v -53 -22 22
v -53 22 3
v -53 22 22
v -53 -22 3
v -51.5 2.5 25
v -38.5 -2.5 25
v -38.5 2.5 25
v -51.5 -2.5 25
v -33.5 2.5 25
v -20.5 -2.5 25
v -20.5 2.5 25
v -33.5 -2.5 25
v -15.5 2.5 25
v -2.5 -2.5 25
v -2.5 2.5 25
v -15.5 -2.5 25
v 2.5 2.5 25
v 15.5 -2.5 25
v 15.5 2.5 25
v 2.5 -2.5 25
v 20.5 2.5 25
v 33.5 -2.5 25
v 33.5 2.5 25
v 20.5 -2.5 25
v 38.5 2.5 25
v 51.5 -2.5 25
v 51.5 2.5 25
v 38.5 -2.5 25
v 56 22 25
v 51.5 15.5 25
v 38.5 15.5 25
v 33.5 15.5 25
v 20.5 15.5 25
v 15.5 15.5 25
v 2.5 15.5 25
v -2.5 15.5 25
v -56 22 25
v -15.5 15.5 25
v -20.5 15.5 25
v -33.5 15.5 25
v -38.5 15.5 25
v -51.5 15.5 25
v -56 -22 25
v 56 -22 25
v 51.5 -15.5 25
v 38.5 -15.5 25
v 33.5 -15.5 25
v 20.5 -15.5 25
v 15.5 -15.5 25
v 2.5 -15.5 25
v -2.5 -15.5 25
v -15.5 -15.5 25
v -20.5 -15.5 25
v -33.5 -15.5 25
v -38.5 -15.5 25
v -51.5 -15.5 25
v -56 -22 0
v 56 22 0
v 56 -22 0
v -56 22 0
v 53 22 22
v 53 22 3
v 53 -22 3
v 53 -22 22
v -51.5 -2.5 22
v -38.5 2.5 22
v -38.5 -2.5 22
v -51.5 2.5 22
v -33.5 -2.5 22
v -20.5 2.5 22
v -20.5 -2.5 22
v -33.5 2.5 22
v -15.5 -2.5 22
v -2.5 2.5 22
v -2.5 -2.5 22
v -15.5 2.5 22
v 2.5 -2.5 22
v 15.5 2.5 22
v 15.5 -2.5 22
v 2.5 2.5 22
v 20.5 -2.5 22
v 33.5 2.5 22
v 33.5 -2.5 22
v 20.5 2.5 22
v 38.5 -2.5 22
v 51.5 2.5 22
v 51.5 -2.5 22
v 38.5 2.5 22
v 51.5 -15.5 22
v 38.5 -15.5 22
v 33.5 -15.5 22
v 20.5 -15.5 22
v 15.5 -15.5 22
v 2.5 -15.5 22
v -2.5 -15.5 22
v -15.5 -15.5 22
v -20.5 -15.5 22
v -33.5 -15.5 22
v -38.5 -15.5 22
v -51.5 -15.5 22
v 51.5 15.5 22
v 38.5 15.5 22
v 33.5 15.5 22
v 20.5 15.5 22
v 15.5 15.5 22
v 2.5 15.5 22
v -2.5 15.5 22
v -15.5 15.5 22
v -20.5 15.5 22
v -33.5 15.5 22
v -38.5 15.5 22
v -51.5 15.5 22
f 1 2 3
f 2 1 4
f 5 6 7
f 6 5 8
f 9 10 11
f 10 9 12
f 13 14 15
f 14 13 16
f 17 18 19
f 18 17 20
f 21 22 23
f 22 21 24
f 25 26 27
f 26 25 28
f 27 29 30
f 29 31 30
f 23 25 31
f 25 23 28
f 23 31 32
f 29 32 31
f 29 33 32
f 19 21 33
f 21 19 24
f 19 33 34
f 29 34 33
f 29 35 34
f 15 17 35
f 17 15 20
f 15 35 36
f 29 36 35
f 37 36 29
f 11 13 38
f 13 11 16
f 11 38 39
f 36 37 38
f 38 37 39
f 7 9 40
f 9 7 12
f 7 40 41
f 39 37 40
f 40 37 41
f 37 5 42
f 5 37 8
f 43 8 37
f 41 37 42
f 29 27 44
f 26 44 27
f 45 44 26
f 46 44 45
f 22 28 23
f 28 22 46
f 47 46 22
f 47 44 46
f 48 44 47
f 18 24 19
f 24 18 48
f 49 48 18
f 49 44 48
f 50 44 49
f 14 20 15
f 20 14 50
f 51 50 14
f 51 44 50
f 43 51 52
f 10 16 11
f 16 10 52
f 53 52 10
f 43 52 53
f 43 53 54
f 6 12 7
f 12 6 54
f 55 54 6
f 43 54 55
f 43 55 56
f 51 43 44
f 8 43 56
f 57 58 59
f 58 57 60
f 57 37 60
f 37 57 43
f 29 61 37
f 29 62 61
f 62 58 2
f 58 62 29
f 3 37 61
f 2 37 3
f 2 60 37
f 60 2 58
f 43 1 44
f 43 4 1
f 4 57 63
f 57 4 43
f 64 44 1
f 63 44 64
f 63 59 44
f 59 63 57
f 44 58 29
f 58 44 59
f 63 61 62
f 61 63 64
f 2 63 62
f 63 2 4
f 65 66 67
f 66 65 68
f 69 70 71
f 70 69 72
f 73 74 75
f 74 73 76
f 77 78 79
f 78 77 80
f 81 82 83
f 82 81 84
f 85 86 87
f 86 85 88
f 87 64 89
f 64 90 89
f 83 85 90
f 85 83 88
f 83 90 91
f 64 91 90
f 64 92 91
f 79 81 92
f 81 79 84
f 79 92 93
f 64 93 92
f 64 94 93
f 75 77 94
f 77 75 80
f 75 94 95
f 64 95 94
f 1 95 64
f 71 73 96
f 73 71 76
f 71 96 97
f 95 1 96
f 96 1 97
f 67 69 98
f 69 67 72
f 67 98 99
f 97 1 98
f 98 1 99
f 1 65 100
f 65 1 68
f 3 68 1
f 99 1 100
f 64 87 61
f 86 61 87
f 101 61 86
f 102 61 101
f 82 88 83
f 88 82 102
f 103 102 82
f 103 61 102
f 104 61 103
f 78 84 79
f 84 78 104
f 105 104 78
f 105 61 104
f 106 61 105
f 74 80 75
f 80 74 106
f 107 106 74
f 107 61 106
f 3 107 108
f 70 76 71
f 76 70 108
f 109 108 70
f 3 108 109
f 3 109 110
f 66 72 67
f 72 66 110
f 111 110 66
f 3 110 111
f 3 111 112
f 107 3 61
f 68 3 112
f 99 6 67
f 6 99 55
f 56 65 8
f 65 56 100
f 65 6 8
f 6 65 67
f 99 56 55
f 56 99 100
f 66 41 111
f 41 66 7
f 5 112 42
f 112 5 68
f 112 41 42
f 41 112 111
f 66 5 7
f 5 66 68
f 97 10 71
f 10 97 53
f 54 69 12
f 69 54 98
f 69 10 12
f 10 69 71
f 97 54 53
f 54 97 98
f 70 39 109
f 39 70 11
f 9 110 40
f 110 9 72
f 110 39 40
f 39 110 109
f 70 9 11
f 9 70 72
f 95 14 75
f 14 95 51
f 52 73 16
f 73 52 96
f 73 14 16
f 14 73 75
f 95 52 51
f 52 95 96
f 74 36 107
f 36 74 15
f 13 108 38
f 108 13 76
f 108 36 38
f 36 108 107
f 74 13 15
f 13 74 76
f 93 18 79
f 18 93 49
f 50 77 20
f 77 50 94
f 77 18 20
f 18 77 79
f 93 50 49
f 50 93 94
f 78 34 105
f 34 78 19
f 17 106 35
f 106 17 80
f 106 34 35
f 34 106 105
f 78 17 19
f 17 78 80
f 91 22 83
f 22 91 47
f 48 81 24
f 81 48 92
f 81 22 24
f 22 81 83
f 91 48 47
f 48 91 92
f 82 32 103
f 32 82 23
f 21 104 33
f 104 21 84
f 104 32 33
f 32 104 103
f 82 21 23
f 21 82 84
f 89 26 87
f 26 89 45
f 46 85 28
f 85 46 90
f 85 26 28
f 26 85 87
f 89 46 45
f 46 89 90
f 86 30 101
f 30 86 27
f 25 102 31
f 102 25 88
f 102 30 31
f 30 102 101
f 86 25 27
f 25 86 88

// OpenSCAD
// KNOWN-WRONG PART (must fail): only the two end walls carry the deck (the five ribs are missing)
// Open-sided rack for 12 standard 12.5 mm square cuvettes (2 rows of 6)
// Category: benchware. A base plate and a perforated deck joined by seven upright walls that run
// front to back; the long sides stay open, so the cuvettes can be seen and read in the rack.
// The deck bridges only 15.5 mm between walls, so it prints without supports.
// Print: PLA or PETG, base on the bed, 0.2 mm layers.
// SPDX-License-Identifier: CERN-OHL-P-2.0

/* [Rack] */
plate = [112, 44];        // X, Y of the base plate and the deck [mm]
base_t = 3;               // base plate z = 0 .. 3
deck_z = 22;              // deck from z = 22 ...
deck_t = 3;               // ... to z = 25
end_t = 3;                // end walls, flush with the short ends
rib_t = 2.5;              // inner ribs
rib_x = [];
cols = 6;                 // holes along X
rows = 2;                 // holes along Y
pitch = 18;               // centre-to-centre in X and Y
hole = 13;                // square hole for a 12.5 mm cuvette

/* [Hidden] */
eps = 0.01;
H = deck_z + deck_t;

difference() {
    union() {
        translate([-plate.x / 2, -plate.y / 2, 0]) cube([plate.x, plate.y, base_t]);
        translate([-plate.x / 2, -plate.y / 2, deck_z]) cube([plate.x, plate.y, deck_t]);
        for (s = [-1, 1])
            translate([s > 0 ? plate.x / 2 - end_t : -plate.x / 2, -plate.y / 2, 0]) cube([end_t, plate.y, H]);
        for (x = rib_x)
            translate([x - rib_t / 2, -plate.y / 2, 0]) cube([rib_t, plate.y, H]);
    }
    for (i = [0 : cols - 1], j = [0 : rows - 1])
        translate([(i - (cols - 1) / 2) * pitch - hole / 2, (j - (rows - 1) / 2) * pitch - hole / 2, deck_z - eps])
            cube([hole, hole, deck_t + 2 * eps]);
}
